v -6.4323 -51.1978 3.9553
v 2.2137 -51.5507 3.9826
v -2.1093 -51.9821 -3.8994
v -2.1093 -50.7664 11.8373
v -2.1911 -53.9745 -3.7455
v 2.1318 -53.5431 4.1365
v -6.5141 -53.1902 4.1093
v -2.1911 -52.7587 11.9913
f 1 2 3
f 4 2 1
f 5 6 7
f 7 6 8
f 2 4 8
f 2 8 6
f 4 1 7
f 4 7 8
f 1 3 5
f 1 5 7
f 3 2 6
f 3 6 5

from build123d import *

# Parameters (mm, degrees)
F1_DEPTH = 2
F6_DEPTH = 2


with BuildPart() as f1:
    # F0 (on Front) → F1 (new body)
    with BuildSketch(Plane.XZ):
        Polygon((5.1576569676, 2.7410463956), (0, 0), (5.1576569676, -2.7410463956), (10.3153139353, 0), align=None)
    extrude(amount=F1_DEPTH)


with BuildPart() as f6:
    # F5 (on face) → F6 (new body)
    with BuildSketch(Plane(origin=(-2.1093194974, -51.3742344161, 3.9689756511), x_dir=(-0.9991631758, 0.0407801704, -0.003150519), z_dir=(0.0409016879, 0.9961946981, -0.0769621688))):
        Polygon((0, 7.8918055439), (-4.3265928001, 0), (0, -7.8918055439), (4.3265928001, 0), align=None)
    extrude(amount=-F6_DEPTH)


solid = f6.part
